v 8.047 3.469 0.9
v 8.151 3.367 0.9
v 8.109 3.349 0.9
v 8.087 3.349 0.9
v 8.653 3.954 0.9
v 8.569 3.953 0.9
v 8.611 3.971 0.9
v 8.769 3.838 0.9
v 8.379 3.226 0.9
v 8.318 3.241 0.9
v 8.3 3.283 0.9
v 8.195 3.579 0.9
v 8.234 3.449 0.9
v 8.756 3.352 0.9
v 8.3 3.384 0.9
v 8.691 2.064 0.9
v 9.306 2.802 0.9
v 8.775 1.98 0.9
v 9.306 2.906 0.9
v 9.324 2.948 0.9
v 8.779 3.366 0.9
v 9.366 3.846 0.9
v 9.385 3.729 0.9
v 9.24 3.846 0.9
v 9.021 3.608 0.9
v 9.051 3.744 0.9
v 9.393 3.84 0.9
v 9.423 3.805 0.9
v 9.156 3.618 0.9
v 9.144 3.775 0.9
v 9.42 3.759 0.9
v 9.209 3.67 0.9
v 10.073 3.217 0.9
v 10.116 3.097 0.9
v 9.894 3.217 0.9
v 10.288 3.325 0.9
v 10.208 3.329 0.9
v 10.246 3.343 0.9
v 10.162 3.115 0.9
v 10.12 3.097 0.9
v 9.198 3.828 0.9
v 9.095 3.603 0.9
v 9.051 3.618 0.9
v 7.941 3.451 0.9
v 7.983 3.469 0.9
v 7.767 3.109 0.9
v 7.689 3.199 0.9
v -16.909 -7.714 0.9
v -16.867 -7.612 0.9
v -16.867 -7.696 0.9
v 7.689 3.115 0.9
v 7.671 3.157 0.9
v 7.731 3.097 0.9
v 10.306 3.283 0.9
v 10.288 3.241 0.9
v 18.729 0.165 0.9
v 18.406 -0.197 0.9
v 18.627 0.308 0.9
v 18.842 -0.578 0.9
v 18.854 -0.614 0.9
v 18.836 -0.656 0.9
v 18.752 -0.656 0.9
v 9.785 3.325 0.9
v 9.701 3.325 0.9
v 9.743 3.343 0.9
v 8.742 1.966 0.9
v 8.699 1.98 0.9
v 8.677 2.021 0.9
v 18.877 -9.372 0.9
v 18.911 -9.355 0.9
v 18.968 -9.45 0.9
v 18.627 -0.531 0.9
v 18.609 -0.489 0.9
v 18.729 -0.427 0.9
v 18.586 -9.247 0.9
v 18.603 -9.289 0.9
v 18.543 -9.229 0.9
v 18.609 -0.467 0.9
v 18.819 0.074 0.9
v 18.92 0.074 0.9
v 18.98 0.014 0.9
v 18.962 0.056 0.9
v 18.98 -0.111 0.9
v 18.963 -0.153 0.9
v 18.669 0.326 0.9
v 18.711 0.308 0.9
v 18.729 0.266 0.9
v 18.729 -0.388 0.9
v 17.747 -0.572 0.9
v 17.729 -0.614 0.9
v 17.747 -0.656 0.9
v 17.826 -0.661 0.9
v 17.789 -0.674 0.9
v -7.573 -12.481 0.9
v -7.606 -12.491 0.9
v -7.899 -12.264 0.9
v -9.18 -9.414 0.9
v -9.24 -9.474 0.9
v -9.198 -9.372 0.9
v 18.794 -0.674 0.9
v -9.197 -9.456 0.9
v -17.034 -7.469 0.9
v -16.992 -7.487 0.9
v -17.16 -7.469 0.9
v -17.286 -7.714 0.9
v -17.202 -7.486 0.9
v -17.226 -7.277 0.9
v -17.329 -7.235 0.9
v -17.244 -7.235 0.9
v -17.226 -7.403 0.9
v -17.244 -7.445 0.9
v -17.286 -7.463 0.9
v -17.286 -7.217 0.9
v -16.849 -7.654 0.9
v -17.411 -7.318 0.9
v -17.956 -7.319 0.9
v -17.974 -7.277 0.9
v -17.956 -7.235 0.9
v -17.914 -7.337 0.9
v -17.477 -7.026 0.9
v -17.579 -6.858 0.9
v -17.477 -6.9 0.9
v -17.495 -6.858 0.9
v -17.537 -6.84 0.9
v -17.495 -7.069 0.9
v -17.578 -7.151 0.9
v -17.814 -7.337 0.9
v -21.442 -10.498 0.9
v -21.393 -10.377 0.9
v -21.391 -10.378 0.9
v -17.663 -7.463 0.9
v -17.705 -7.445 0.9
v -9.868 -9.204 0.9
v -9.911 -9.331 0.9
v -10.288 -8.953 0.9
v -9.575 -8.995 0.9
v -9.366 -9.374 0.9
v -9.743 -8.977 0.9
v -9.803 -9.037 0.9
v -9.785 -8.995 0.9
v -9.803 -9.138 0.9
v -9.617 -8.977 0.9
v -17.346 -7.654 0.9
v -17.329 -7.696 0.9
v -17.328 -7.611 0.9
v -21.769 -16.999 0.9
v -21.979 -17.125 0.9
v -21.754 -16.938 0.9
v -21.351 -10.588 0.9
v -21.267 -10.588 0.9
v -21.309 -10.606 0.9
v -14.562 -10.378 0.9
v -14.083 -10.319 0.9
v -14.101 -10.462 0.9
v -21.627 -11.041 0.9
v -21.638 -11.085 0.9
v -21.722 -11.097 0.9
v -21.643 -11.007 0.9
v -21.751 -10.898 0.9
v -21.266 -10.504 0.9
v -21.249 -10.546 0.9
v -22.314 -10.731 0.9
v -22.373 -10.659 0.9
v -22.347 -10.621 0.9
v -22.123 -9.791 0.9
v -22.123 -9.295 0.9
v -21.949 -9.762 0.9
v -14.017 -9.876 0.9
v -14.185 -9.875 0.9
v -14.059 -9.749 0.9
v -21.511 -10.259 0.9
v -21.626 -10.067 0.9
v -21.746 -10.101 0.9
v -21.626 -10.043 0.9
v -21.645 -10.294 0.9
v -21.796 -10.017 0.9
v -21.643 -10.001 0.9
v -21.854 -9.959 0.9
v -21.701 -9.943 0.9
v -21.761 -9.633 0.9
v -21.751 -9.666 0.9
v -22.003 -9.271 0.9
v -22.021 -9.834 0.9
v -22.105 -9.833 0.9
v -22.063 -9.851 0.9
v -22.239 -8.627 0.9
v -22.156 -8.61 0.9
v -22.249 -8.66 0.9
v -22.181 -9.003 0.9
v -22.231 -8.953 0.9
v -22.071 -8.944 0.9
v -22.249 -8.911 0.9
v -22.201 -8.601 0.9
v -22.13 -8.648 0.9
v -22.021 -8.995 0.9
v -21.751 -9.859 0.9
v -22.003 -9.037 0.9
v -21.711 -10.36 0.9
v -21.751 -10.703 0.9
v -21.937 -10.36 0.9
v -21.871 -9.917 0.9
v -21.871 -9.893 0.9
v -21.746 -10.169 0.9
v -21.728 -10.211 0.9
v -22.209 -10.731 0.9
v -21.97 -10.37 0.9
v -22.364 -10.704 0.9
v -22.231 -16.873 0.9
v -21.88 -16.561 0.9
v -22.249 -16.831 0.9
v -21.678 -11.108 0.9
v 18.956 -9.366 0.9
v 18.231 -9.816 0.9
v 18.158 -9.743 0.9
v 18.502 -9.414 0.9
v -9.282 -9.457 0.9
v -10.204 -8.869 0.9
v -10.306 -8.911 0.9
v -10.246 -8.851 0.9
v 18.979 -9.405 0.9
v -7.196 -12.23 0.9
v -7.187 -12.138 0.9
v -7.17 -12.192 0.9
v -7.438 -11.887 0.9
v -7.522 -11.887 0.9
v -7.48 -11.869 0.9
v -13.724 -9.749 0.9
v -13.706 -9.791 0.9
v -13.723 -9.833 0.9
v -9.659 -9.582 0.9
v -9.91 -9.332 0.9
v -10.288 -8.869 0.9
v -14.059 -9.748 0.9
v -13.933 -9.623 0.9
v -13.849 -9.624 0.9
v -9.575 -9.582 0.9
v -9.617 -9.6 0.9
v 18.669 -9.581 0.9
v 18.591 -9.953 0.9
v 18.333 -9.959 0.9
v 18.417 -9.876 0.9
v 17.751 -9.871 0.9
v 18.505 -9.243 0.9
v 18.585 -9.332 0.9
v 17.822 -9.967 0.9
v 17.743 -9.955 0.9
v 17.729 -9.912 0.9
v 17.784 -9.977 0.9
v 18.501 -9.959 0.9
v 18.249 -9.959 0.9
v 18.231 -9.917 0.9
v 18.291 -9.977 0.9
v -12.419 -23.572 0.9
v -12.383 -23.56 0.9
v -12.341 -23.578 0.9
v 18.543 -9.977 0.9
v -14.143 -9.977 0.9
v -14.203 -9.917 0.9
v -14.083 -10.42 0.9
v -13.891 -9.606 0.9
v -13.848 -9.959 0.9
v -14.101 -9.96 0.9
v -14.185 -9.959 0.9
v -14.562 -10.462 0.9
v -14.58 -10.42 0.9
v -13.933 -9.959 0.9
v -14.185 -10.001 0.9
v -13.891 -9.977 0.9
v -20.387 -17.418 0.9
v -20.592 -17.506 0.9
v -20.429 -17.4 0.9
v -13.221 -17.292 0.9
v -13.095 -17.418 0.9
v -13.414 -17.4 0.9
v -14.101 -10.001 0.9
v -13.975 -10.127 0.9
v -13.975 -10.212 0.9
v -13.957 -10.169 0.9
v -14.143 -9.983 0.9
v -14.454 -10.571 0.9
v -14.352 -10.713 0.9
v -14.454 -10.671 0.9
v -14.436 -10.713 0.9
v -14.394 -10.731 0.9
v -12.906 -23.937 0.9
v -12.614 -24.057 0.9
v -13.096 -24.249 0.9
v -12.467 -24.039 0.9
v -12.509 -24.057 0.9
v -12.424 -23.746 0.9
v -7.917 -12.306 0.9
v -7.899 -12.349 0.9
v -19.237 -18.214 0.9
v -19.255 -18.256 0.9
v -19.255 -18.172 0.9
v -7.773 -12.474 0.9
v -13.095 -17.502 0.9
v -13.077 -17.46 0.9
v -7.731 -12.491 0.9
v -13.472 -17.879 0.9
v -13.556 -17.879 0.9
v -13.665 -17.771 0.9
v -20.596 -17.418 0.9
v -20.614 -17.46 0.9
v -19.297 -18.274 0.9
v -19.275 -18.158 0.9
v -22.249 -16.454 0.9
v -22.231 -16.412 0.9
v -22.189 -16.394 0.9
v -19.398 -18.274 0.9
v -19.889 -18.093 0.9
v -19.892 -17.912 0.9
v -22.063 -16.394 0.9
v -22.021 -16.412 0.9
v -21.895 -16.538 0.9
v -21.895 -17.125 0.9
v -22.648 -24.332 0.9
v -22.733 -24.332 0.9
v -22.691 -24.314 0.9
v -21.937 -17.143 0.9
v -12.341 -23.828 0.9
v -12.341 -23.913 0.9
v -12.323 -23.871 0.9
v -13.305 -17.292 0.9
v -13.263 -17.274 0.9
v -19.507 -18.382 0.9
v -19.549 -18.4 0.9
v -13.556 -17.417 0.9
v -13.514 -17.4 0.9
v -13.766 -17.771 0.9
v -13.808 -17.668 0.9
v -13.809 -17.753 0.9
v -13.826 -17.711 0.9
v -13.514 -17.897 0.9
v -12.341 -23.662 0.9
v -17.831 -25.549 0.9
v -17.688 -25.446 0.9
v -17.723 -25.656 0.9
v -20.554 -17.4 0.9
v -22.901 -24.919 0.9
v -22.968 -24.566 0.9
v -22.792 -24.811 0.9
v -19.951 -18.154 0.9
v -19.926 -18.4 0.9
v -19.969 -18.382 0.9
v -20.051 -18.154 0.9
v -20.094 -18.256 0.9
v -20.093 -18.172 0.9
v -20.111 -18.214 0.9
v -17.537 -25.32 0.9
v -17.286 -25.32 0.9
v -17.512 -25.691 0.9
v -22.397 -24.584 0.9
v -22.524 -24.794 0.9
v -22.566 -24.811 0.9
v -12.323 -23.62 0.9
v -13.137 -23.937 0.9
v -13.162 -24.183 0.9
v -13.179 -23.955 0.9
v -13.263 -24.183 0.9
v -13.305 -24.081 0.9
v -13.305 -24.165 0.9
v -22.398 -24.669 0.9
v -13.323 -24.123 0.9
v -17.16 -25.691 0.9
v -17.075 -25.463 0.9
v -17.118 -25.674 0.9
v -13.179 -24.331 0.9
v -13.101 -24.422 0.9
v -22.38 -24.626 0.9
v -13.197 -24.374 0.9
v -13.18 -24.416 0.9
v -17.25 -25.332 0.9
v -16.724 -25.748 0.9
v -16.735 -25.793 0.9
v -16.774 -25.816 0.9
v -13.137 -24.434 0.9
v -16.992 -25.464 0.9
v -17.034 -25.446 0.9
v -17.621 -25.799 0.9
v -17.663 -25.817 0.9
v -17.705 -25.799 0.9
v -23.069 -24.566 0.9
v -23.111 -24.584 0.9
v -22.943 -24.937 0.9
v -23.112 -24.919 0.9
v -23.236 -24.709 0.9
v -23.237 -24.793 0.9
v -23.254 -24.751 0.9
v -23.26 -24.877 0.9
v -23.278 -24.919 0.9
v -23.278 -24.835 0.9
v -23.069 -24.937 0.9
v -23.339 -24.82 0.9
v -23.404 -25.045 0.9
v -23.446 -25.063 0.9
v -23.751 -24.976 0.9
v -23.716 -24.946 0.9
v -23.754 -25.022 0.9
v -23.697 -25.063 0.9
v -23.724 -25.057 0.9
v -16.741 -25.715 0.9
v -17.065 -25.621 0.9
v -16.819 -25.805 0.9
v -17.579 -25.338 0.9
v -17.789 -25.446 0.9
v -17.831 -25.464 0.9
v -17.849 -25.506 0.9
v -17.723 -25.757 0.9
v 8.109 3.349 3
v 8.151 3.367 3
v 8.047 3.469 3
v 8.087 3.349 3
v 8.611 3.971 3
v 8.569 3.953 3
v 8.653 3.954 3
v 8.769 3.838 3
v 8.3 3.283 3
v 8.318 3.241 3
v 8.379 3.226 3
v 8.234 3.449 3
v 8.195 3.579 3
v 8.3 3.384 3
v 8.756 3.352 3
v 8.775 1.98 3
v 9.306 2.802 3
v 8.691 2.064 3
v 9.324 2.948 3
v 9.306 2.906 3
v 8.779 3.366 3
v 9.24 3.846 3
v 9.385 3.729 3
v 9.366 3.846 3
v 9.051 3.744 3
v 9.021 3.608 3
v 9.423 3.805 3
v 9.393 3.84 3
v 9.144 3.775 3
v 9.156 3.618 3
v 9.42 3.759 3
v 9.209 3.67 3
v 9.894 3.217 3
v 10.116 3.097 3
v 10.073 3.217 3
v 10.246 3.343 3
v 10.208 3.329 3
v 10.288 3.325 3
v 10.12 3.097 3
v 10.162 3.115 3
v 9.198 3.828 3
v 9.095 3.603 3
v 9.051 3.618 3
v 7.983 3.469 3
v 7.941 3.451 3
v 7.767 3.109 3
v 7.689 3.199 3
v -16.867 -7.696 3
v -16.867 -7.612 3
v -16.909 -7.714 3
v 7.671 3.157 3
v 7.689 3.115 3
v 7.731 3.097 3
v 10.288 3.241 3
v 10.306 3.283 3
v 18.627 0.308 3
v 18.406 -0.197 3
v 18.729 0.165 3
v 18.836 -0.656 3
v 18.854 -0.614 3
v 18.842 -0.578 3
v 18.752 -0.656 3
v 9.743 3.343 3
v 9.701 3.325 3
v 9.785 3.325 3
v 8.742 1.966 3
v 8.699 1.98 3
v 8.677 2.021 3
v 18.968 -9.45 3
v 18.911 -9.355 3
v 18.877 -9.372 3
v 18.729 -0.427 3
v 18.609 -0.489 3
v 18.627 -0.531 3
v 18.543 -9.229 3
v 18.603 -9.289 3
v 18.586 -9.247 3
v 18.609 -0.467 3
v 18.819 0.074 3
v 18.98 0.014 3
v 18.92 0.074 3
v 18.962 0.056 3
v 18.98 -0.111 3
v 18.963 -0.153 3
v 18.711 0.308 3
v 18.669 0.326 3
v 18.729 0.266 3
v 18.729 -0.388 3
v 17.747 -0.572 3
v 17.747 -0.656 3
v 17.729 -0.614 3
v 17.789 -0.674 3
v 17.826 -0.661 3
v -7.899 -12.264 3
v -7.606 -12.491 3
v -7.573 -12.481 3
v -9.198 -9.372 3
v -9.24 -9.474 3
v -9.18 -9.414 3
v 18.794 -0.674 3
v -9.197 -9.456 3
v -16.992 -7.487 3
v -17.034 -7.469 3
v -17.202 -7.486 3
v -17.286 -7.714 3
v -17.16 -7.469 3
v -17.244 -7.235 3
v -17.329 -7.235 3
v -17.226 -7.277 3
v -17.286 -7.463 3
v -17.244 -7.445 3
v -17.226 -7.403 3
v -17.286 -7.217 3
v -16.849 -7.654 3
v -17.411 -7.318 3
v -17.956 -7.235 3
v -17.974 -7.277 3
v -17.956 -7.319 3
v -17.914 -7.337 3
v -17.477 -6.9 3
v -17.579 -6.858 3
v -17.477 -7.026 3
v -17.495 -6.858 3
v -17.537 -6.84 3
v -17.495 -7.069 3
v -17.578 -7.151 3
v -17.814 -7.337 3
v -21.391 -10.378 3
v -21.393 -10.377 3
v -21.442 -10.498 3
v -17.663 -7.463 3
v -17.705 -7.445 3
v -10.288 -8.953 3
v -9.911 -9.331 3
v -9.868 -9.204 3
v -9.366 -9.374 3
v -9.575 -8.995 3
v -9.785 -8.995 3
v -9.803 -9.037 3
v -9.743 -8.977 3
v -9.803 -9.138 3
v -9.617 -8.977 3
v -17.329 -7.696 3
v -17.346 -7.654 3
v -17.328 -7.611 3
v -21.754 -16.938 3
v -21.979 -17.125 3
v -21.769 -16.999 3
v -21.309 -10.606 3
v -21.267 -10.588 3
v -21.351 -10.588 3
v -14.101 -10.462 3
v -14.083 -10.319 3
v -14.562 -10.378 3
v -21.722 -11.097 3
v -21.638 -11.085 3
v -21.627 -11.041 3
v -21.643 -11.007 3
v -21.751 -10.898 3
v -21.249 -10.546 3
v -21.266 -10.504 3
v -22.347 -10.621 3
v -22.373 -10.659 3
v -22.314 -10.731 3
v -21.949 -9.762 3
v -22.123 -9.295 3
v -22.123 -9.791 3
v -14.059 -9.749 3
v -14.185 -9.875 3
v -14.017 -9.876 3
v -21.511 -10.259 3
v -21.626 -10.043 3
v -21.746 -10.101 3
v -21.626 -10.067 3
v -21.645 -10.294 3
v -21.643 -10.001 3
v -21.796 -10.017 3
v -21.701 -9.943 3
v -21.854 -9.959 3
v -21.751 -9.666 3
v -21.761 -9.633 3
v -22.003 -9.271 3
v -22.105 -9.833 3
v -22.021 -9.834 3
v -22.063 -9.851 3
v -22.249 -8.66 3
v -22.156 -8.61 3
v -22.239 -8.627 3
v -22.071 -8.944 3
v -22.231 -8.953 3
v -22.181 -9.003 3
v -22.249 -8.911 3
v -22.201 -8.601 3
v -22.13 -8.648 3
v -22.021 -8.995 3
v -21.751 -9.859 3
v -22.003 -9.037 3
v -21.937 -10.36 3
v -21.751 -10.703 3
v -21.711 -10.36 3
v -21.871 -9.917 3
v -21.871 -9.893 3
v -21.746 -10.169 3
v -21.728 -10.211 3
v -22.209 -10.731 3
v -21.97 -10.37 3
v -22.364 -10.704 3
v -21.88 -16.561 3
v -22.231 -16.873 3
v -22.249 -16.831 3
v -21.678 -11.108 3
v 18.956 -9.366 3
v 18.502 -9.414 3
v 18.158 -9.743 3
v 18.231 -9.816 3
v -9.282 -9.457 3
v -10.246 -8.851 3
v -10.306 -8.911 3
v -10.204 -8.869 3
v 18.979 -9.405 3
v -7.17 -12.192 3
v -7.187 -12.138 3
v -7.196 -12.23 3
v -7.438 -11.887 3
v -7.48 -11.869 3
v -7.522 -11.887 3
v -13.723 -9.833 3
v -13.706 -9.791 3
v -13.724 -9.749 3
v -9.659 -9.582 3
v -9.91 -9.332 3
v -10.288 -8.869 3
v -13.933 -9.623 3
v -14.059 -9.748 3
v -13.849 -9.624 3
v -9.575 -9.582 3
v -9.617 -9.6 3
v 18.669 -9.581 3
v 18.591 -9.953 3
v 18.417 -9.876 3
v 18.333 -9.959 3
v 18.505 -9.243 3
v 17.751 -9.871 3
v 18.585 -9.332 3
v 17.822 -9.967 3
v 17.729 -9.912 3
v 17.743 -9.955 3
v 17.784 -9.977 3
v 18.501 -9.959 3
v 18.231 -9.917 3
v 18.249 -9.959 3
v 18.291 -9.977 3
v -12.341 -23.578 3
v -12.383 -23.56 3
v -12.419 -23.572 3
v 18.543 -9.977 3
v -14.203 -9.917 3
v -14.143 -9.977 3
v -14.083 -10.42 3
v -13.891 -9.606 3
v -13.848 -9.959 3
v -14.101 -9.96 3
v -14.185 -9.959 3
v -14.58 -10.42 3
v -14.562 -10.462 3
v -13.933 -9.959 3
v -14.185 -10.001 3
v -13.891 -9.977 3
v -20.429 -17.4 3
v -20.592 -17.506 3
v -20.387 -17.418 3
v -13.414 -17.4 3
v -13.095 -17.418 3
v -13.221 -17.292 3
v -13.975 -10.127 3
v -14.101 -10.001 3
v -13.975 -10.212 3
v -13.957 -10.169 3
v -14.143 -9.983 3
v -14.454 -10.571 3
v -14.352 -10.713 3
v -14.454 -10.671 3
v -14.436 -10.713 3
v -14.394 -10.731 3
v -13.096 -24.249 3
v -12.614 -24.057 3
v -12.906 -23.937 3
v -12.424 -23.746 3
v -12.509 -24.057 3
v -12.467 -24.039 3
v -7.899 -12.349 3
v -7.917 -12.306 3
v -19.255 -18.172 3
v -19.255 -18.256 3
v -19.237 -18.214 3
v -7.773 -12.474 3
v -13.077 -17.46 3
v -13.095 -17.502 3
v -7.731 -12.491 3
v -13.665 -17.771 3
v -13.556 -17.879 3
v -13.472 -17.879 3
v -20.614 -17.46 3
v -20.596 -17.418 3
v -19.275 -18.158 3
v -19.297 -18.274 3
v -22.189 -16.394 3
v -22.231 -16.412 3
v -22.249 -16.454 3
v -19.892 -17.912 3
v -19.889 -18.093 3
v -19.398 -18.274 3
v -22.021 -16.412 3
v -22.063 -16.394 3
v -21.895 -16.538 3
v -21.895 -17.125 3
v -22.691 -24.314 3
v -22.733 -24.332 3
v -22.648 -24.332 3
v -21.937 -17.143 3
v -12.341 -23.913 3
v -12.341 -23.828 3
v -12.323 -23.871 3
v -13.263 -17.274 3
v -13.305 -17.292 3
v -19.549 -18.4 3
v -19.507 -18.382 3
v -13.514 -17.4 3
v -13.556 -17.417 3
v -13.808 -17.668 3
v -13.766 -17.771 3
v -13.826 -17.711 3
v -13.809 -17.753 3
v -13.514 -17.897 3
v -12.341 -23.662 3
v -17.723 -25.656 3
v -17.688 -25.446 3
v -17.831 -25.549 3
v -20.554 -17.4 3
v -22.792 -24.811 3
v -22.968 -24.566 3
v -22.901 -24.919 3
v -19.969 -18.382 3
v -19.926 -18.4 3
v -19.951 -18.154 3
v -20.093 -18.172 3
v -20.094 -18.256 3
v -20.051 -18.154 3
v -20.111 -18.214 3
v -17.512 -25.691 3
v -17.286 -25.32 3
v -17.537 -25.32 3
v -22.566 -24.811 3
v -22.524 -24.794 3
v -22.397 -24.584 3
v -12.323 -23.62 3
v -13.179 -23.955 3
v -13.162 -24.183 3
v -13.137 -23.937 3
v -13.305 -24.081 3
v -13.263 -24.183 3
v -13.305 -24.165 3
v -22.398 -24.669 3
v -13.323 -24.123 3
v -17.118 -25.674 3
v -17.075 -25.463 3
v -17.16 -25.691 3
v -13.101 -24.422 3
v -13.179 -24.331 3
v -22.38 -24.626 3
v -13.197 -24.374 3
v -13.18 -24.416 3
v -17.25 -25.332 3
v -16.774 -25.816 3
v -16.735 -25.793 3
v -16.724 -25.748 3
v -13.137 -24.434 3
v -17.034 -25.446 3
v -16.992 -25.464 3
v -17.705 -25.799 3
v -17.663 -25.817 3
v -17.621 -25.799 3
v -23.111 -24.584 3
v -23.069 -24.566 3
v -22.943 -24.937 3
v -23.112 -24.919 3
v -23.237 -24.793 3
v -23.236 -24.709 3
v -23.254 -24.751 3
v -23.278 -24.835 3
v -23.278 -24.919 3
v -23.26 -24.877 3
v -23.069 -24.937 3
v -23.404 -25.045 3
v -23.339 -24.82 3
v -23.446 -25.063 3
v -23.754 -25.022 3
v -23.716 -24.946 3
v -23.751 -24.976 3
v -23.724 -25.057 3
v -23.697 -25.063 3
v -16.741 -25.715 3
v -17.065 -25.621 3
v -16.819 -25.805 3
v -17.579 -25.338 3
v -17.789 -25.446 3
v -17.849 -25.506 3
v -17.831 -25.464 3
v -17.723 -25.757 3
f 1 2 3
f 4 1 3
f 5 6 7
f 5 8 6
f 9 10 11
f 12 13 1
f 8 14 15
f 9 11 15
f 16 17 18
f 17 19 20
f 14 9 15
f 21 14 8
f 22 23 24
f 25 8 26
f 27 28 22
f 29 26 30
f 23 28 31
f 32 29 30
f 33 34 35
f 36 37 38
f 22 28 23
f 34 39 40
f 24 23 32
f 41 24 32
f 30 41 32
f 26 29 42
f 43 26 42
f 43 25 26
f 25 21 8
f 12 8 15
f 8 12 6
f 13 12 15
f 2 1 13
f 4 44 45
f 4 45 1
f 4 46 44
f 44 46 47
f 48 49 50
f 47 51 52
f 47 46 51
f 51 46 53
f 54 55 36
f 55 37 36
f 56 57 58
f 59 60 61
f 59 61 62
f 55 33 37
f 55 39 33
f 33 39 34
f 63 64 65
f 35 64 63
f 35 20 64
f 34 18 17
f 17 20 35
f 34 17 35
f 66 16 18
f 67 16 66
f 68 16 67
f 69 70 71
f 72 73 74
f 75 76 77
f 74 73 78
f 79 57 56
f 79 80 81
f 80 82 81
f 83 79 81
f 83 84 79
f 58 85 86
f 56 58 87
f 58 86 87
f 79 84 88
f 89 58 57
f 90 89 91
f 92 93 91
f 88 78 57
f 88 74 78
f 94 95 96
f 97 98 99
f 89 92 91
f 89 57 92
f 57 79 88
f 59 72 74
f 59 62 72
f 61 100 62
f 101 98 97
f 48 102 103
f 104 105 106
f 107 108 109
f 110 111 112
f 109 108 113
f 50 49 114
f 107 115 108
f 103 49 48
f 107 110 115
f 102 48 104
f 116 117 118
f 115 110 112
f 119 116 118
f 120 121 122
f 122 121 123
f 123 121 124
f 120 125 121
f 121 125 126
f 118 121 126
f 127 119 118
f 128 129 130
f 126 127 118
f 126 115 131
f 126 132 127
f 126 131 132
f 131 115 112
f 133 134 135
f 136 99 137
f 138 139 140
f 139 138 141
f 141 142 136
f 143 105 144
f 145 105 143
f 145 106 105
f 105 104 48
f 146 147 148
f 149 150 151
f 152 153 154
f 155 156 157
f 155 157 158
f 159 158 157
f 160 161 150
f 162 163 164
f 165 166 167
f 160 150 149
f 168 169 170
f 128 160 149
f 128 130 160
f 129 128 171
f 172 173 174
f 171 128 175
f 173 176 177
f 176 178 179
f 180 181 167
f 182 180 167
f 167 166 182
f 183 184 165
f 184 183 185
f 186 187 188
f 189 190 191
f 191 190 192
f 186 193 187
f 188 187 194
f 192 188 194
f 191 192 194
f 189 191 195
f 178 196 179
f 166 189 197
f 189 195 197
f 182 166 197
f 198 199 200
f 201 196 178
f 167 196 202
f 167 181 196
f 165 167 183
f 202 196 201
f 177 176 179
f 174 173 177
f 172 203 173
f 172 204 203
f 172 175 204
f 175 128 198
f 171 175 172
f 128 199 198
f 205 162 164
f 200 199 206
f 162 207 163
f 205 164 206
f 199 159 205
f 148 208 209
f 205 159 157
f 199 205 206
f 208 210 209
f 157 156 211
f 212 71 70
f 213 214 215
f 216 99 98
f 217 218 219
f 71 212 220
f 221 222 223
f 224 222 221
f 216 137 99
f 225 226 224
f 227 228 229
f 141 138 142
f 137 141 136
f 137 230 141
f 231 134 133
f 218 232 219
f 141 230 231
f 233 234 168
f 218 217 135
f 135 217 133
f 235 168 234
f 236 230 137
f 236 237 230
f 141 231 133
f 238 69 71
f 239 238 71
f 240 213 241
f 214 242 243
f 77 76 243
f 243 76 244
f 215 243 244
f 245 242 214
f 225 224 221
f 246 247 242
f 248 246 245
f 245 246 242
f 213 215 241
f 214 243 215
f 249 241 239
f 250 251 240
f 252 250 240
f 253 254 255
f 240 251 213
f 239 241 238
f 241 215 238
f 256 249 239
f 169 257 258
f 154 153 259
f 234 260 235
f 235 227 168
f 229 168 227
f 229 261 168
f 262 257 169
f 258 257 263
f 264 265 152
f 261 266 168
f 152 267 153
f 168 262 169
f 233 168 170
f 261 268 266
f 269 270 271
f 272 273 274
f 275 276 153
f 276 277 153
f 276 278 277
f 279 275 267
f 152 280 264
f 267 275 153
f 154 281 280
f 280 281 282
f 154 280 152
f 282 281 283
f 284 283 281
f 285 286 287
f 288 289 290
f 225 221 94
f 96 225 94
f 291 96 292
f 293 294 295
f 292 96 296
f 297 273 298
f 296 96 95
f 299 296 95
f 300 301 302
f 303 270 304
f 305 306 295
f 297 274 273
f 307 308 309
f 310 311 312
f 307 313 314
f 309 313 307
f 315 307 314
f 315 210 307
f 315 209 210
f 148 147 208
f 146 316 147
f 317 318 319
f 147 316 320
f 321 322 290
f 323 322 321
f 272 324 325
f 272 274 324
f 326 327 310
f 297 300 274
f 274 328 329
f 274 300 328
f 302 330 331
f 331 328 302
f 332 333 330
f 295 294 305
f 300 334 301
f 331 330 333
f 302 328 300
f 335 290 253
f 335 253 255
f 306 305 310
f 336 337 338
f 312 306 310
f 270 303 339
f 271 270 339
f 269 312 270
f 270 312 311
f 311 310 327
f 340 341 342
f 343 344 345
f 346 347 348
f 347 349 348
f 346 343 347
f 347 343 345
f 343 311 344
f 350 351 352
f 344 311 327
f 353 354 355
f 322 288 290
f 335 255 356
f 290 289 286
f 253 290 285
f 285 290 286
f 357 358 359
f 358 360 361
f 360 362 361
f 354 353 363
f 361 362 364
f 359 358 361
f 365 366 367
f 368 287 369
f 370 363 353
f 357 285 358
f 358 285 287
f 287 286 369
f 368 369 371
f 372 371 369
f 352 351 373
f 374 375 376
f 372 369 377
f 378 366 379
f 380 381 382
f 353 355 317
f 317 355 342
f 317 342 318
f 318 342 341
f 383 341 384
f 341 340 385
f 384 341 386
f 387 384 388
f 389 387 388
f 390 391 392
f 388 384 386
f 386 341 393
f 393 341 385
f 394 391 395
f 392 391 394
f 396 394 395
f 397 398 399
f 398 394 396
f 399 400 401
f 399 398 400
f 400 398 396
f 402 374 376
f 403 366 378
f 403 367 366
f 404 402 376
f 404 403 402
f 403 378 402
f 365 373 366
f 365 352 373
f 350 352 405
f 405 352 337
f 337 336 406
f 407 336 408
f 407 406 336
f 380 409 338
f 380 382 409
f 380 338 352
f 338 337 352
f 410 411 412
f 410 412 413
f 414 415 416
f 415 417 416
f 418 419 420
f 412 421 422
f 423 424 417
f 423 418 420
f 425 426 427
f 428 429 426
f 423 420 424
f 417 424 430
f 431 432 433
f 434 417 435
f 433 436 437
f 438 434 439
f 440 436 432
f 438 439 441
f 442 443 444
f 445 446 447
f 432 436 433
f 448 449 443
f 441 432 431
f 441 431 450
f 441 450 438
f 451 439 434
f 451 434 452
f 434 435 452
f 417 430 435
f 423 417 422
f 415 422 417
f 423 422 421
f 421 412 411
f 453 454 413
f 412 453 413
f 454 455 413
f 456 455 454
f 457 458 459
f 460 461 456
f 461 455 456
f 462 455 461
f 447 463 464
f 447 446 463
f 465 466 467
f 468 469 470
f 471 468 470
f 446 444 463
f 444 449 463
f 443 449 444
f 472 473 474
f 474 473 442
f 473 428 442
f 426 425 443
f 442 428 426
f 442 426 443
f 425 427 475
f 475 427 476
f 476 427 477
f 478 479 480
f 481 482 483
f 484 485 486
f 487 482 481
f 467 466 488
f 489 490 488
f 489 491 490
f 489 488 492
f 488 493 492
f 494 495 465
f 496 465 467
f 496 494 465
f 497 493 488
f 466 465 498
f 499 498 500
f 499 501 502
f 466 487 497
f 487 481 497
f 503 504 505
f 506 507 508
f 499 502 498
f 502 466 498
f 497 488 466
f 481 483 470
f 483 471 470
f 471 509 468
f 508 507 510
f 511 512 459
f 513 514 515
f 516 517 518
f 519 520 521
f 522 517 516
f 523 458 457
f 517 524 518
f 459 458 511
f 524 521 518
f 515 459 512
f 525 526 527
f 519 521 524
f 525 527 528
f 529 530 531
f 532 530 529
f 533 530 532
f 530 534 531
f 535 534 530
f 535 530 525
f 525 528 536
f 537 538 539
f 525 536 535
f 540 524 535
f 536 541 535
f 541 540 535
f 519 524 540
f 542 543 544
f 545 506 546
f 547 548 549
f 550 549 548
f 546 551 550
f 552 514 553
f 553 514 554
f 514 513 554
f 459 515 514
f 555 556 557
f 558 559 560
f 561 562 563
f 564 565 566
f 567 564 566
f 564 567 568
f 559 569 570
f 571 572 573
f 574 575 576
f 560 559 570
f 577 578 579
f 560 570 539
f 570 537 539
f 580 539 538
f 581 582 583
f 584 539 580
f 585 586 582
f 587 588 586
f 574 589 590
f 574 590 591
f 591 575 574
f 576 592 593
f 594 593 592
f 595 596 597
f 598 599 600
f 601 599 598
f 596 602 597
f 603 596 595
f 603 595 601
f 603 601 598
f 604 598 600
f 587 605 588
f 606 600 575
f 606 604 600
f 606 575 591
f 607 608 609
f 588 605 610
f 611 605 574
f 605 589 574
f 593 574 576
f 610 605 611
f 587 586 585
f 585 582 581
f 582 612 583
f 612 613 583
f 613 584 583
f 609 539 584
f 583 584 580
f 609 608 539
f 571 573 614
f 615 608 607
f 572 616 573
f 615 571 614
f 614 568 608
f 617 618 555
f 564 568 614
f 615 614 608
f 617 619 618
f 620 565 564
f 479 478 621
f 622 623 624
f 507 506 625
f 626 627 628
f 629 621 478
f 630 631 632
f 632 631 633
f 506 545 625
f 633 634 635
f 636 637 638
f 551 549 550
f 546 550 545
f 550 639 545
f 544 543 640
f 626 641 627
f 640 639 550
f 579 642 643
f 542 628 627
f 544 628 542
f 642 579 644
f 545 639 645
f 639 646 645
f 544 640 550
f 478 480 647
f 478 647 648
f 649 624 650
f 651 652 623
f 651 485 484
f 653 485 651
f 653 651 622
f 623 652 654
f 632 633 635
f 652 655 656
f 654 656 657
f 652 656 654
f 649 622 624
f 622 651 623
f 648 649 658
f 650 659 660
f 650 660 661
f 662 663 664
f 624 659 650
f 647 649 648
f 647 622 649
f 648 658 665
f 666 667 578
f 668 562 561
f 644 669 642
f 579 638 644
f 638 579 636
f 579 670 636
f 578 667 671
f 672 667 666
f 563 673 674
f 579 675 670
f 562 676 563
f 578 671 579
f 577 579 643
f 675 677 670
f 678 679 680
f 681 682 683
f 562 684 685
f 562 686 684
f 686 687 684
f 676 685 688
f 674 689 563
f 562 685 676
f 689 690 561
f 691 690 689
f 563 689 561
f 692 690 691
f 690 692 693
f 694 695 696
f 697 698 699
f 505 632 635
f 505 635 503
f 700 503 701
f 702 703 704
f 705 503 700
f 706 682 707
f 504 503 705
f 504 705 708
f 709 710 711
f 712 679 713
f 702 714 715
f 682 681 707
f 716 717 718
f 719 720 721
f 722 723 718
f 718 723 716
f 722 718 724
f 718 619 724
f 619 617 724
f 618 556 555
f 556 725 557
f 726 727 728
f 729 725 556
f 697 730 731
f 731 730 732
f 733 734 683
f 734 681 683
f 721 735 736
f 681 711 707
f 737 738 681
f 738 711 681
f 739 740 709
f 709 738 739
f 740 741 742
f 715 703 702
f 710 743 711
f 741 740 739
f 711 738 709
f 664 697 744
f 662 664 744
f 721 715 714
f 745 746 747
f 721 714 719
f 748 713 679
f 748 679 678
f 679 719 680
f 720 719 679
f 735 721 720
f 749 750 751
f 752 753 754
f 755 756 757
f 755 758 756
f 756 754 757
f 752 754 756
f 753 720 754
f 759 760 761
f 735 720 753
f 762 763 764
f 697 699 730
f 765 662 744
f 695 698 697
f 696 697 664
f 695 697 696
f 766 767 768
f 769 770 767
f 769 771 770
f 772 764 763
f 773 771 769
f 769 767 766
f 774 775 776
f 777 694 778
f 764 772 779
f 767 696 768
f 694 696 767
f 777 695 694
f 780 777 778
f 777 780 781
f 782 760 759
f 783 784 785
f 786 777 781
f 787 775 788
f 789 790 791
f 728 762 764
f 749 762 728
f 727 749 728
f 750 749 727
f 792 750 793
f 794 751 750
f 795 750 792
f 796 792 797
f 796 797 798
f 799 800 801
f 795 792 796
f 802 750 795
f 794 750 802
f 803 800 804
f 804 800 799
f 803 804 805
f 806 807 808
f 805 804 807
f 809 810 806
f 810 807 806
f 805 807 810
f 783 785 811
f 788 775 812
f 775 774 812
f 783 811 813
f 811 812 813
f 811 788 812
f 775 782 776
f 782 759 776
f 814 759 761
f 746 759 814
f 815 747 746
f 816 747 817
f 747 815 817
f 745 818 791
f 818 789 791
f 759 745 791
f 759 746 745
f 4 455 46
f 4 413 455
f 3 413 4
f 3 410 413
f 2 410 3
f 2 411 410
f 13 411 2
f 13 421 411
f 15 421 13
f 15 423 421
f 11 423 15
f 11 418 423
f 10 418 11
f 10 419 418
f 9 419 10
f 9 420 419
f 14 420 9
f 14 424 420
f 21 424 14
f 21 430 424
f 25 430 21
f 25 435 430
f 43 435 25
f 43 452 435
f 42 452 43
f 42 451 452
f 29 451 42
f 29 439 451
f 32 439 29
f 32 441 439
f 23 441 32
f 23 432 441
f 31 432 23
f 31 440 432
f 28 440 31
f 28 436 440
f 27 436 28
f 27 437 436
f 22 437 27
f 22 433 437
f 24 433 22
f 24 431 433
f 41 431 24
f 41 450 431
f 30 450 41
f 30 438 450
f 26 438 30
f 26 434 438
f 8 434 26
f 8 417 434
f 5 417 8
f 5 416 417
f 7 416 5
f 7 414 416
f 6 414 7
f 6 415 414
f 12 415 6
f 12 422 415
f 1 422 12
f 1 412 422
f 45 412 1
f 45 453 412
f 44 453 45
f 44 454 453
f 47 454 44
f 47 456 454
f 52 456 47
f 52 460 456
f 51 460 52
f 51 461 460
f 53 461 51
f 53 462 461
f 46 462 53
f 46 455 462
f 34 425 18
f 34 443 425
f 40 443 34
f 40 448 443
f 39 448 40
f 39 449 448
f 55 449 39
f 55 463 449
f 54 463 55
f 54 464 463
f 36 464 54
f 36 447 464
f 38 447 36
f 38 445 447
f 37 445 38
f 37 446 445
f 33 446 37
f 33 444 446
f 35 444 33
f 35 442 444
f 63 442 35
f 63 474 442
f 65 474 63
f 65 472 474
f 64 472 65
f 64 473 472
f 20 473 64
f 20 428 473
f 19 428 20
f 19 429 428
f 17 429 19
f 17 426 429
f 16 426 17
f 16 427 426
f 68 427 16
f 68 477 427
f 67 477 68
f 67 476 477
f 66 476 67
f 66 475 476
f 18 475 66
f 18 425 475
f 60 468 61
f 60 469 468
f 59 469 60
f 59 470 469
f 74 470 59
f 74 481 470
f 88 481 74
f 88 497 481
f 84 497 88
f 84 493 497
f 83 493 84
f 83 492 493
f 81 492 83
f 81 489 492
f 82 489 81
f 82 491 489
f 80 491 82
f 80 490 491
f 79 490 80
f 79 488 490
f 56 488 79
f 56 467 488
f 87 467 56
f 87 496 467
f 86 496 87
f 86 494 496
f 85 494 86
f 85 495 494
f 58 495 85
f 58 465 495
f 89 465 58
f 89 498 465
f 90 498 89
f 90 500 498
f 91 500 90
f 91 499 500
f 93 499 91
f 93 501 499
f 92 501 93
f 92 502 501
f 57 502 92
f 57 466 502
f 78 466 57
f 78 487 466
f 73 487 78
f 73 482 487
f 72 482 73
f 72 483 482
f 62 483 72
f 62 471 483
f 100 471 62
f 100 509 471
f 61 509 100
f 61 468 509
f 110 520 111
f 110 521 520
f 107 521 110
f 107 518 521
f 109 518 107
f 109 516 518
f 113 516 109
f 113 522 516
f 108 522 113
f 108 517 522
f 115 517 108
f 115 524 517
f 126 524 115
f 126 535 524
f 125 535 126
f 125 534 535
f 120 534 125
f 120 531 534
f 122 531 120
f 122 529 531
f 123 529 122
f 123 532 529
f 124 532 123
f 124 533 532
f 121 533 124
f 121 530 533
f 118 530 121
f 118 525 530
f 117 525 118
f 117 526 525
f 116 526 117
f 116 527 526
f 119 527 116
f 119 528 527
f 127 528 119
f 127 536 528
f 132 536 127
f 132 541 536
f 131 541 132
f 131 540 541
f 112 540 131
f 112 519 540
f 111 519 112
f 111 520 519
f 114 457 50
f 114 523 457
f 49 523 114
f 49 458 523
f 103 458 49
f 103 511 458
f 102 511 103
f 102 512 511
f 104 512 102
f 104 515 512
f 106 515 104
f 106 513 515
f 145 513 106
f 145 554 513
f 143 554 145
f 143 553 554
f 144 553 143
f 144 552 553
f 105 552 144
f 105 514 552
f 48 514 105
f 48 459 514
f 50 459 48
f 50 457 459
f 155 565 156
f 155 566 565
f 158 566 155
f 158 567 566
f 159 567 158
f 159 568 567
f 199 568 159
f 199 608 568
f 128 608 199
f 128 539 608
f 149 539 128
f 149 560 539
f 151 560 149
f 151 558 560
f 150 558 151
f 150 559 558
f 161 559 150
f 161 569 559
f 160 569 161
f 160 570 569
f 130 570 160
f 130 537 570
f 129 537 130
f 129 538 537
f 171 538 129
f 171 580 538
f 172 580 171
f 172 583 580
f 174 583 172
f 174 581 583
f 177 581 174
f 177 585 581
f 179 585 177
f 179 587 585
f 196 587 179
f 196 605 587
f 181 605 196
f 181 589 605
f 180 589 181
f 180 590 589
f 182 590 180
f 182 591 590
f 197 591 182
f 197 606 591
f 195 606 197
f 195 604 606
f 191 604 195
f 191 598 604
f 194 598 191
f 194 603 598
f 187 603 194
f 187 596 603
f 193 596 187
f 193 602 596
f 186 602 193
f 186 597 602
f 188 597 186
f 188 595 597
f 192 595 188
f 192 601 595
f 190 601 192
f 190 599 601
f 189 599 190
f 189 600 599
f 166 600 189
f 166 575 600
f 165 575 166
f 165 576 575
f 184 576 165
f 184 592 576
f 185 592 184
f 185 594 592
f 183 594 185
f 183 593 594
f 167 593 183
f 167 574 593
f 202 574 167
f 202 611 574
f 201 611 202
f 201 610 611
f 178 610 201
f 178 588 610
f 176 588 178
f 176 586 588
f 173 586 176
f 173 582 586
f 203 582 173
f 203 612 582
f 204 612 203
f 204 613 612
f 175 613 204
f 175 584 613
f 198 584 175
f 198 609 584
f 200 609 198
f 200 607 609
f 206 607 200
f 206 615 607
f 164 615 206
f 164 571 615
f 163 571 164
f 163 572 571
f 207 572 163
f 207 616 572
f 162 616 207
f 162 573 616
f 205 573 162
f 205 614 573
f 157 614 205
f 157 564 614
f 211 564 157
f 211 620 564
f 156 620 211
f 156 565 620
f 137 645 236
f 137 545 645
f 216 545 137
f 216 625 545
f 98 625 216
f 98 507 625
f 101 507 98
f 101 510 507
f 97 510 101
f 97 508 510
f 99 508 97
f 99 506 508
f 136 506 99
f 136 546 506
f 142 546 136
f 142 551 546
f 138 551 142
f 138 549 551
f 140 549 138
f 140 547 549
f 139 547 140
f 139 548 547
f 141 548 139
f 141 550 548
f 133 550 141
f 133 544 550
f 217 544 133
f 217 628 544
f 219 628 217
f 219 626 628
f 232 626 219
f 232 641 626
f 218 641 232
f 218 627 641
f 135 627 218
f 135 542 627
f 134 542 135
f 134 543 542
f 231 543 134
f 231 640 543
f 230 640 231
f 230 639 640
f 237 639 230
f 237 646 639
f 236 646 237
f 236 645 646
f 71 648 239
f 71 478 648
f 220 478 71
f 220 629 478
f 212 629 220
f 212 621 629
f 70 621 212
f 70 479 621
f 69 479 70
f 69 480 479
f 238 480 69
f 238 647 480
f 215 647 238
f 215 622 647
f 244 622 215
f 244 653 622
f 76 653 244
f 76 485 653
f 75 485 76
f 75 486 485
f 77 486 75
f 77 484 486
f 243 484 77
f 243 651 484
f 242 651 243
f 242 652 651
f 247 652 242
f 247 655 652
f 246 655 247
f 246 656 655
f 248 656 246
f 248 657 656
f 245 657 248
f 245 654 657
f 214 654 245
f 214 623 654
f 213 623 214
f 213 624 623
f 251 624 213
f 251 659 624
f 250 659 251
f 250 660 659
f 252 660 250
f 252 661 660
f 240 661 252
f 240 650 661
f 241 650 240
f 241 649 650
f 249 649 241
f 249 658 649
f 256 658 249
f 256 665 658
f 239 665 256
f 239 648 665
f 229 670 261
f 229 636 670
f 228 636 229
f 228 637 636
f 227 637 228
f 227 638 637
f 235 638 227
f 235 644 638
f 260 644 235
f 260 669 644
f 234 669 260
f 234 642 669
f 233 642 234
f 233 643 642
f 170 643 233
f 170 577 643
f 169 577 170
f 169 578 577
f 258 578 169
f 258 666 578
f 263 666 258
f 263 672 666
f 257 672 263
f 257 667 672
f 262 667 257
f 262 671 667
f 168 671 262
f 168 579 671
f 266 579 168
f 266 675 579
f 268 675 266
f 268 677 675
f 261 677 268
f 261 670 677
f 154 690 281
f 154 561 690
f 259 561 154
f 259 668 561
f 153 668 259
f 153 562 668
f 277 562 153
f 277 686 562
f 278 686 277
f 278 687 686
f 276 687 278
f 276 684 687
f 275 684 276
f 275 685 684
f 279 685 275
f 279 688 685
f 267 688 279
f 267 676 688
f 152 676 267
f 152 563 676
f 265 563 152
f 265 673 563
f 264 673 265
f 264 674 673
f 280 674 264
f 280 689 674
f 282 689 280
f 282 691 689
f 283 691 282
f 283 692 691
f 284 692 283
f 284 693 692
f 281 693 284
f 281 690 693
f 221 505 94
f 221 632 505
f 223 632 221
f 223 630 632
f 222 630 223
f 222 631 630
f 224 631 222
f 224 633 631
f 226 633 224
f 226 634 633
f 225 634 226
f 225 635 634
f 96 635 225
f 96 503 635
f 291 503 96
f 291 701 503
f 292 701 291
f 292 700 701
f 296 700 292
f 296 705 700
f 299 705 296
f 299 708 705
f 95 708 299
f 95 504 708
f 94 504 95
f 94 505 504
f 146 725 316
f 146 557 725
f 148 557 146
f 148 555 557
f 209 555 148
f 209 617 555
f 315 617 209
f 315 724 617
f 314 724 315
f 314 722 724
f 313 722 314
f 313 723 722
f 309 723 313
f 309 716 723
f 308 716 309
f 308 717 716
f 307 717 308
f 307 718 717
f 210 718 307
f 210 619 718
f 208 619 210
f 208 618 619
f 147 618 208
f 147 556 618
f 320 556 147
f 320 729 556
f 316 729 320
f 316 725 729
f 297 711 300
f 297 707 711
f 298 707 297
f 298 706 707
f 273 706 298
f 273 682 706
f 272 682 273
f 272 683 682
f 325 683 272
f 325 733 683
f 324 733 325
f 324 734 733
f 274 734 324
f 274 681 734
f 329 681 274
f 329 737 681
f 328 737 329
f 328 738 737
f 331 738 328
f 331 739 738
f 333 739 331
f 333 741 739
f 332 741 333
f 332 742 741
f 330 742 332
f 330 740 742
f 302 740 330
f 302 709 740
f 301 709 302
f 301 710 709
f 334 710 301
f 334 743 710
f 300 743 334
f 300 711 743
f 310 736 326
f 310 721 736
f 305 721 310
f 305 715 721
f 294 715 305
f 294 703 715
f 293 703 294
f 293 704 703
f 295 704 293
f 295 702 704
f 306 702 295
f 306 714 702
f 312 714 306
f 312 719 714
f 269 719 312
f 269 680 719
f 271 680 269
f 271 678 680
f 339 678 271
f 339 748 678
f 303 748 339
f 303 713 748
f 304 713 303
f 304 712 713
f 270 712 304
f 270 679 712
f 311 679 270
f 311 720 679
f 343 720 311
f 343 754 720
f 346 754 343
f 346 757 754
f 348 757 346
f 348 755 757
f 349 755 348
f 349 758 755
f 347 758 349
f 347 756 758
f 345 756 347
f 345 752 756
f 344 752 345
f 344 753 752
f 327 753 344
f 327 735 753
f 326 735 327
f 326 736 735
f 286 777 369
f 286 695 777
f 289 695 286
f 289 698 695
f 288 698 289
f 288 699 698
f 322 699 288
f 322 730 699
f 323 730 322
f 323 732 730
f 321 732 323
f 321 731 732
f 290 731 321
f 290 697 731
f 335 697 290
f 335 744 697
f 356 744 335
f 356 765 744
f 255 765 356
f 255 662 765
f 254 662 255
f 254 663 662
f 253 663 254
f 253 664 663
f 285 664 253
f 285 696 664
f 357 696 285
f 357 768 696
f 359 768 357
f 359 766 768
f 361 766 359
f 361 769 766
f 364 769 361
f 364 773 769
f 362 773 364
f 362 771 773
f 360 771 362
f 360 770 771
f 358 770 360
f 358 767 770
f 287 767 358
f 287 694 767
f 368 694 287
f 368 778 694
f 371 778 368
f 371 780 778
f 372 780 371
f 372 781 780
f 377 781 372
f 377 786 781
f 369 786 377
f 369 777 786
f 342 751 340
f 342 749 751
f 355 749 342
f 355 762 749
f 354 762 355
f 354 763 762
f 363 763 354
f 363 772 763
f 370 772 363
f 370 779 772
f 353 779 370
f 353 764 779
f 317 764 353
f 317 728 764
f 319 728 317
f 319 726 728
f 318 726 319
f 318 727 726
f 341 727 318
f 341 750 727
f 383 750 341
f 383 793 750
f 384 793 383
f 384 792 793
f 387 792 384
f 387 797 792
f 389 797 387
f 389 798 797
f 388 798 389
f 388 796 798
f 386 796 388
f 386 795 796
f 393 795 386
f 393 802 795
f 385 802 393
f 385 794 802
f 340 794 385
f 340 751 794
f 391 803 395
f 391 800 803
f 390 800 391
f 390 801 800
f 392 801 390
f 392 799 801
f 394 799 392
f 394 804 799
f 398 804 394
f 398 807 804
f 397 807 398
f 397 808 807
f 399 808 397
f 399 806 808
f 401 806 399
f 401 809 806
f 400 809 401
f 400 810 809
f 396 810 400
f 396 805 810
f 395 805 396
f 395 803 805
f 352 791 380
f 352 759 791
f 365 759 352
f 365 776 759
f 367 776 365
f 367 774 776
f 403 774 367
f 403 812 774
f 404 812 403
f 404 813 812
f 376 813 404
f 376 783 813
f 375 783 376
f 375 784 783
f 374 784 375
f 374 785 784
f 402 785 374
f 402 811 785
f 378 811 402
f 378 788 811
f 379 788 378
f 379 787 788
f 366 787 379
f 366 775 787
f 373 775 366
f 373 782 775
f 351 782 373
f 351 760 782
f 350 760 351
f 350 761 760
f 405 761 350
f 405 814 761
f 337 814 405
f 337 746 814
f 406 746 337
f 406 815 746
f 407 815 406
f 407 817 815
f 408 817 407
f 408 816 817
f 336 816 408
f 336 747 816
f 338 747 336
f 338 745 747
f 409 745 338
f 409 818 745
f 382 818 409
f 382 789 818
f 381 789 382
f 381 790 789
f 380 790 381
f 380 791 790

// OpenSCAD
$fn = 24;
translate([0, -2.500, 0.900])
  linear_extrude(height=2.100) {
offset(r=0.06, $fn=8) {
    polygon(points=[[-16.909,-22.629],[-17.286,-22.880],[-17.537,-22.880],[-17.663,-23.006],[-17.789,-23.006],[-17.663,-23.131],[-17.663,-23.257],[-17.537,-23.131],[-17.160,-23.131],[-17.034,-23.006],[-16.783,-23.257],[-17.286,-22.880]], paths=[[0,1,2,3,4,5,6,7,8,9,10,11]]);
    polygon(points=[[-22.440,-21.623],[-22.943,-22.126],[-23.069,-22.126],[-23.320,-22.377],[-23.697,-22.503],[-23.446,-22.503],[-23.194,-22.251],[-23.069,-22.377],[-22.943,-22.377],[-22.817,-22.251],[-22.566,-22.251],[-22.440,-22.126],[-22.314,-22.126],[-22.440,-22.126],[-22.691,-21.874]], paths=[[0,1,2,3,4,5,6,7,8,9,10,11,12,13,14]]);
    polygon(points=[[-12.383,-21.120],[-12.886,-21.497],[-13.137,-21.497],[-13.263,-21.623],[-13.389,-21.623],[-13.137,-21.623],[-13.011,-21.749],[-13.137,-21.874],[-12.634,-21.497],[-12.509,-21.497],[-12.383,-21.371],[-12.509,-21.246]], paths=[[0,1,2,3,4,5,6,7,8,9,10,11]]);
    polygon(points=[[-20.554,-14.960],[-19.800,-15.589],[-19.926,-15.714],[-20.051,-15.714],[-19.926,-15.840],[-20.303,-16.217],[-19.926,-15.840],[-19.549,-15.840],[-19.423,-15.966],[-19.297,-15.966],[-19.423,-15.966],[-19.549,-15.840],[-19.423,-15.714],[-19.297,-15.714],[-19.926,-15.463],[-20.429,-14.960]], paths=[[0,1,2,3,4,5,6,7,8,9,10,11,12,13,14,15]]);
    polygon(points=[[-12.760,-14.583],[-13.137,-14.960],[-13.263,-14.834],[-13.389,-14.960],[-13.514,-14.960],[-13.766,-15.211],[-13.640,-15.211],[-13.514,-15.337],[-13.640,-15.463]], paths=[[0,1,2,3,4,5,6,7,8]]);
    polygon(points=[[-22.189,-13.954],[-22.189,-14.331],[-21.937,-14.583],[-21.811,-14.457],[-21.434,-14.834],[-21.811,-14.457],[-21.937,-14.080],[-22.063,-13.954]], paths=[[0,1,2,3,4,5,6,7]]);
    polygon(points=[[-7.354,-9.303],[-7.857,-9.806],[-7.731,-9.931],[-7.606,-9.931],[-7.229,-9.680],[-7.480,-9.429]], paths=[[0,1,2,3,4,5]]);
    polygon(points=[[-13.891,-7.166],[-14.143,-7.417],[-14.143,-7.543],[-14.646,-8.046],[-14.520,-7.920],[-14.394,-8.046],[-14.394,-8.171],[-14.520,-8.297],[-14.143,-7.920],[-14.143,-7.794],[-14.017,-7.669],[-14.143,-7.543],[-14.143,-7.417],[-14.017,-7.291],[-13.891,-7.417],[-13.766,-7.291]], paths=[[0,1,2,3,4,5,6,7,8,9,10,11,12,13,14,15]]);
    polygon(points=[[18.920,-6.914],[18.669,-7.166],[18.417,-6.914],[18.543,-6.789],[17.789,-7.417],[18.166,-7.166],[18.291,-7.291],[18.291,-7.417],[18.417,-7.291],[18.543,-7.417]], paths=[[0,1,2,3,4,5,6,7,8,9]]);
    polygon(points=[[-10.246,-6.411],[-9.491,-7.166],[-9.617,-7.040],[-9.366,-6.789],[-9.240,-6.914],[-9.617,-6.537],[-9.743,-6.537],[-9.743,-6.663],[-9.869,-6.789]], paths=[[0,1,2,3,4,5,6,7,8]]);
    polygon(points=[[-22.189,-6.160],[-22.189,-6.411],[-22.063,-6.537],[-22.063,-7.291],[-21.937,-7.166],[-21.560,-7.794],[-21.686,-7.920],[-21.937,-7.920],[-22.314,-8.171],[-22.566,-8.171],[-22.189,-8.171],[-21.686,-8.549],[-21.811,-8.423],[-21.811,-8.171],[-21.434,-7.920],[-21.309,-8.046],[-21.686,-7.669],[-21.686,-7.543],[-21.811,-7.417],[-21.811,-7.166],[-22.063,-6.789]], paths=[[0,1,2,3,4,5,6,7,8,9,10,11,12,13,14,15,16,17,18,19,20]]);
    polygon(points=[[-18.040,-4.903],[-18.040,-5.029],[-18.040,-4.903],[-17.914,-4.777],[-17.789,-4.777],[-17.663,-4.903],[-17.286,-4.903],[-17.160,-5.029],[-17.286,-5.154],[-17.537,-5.154],[-16.657,-5.154],[-16.909,-5.154],[-17.034,-5.029],[-17.160,-5.029],[-17.286,-4.903],[-17.286,-4.777],[-17.411,-4.903],[-17.663,-4.651],[-17.537,-4.526],[-17.537,-4.400]], paths=[[0,1,2,3,4,5,6,7,8,9,10,11,12,13,14,15,16,17,18,19]]);
    polygon(points=[[19.800,2.137],[19.674,2.137],[19.549,2.011],[19.297,2.011],[19.171,1.886],[18.794,1.886],[18.669,2.011],[18.669,2.137],[18.920,2.389],[18.920,2.514],[19.171,2.891],[18.920,2.514],[18.794,2.514],[18.669,2.640],[18.669,2.766],[18.794,2.891],[17.789,1.886],[18.417,2.389],[18.794,1.886],[19.171,1.886],[19.297,2.011],[19.549,2.011],[19.674,2.137]], paths=[[0,1,2,3,4,5,6,7,8,9,10,11,12,13,14,15,16,17,18,19,20,21,22]]);
    polygon(points=[[10.246,5.783],[10.120,5.657],[9.869,5.657],[9.743,5.783],[9.743,5.909],[9.743,5.783],[9.366,5.406],[9.366,5.280],[8.737,4.526]], paths=[[0,1,2,3,4,5,6,7,8]]);
    polygon(points=[[9.366,6.286],[9.240,6.286],[9.114,6.160],[8.737,6.286],[8.611,6.411],[8.737,6.537],[8.737,6.663],[8.737,6.537],[8.109,5.909],[7.983,5.909],[7.731,5.657],[8.234,6.034],[8.360,5.909],[8.360,5.783],[8.234,5.657],[8.360,5.783],[8.737,5.909],[8.989,6.160]], paths=[[0,1,2,3,4,5,6,7,8,9,10,11,12,13,14,15,16,17]]);
}
}
